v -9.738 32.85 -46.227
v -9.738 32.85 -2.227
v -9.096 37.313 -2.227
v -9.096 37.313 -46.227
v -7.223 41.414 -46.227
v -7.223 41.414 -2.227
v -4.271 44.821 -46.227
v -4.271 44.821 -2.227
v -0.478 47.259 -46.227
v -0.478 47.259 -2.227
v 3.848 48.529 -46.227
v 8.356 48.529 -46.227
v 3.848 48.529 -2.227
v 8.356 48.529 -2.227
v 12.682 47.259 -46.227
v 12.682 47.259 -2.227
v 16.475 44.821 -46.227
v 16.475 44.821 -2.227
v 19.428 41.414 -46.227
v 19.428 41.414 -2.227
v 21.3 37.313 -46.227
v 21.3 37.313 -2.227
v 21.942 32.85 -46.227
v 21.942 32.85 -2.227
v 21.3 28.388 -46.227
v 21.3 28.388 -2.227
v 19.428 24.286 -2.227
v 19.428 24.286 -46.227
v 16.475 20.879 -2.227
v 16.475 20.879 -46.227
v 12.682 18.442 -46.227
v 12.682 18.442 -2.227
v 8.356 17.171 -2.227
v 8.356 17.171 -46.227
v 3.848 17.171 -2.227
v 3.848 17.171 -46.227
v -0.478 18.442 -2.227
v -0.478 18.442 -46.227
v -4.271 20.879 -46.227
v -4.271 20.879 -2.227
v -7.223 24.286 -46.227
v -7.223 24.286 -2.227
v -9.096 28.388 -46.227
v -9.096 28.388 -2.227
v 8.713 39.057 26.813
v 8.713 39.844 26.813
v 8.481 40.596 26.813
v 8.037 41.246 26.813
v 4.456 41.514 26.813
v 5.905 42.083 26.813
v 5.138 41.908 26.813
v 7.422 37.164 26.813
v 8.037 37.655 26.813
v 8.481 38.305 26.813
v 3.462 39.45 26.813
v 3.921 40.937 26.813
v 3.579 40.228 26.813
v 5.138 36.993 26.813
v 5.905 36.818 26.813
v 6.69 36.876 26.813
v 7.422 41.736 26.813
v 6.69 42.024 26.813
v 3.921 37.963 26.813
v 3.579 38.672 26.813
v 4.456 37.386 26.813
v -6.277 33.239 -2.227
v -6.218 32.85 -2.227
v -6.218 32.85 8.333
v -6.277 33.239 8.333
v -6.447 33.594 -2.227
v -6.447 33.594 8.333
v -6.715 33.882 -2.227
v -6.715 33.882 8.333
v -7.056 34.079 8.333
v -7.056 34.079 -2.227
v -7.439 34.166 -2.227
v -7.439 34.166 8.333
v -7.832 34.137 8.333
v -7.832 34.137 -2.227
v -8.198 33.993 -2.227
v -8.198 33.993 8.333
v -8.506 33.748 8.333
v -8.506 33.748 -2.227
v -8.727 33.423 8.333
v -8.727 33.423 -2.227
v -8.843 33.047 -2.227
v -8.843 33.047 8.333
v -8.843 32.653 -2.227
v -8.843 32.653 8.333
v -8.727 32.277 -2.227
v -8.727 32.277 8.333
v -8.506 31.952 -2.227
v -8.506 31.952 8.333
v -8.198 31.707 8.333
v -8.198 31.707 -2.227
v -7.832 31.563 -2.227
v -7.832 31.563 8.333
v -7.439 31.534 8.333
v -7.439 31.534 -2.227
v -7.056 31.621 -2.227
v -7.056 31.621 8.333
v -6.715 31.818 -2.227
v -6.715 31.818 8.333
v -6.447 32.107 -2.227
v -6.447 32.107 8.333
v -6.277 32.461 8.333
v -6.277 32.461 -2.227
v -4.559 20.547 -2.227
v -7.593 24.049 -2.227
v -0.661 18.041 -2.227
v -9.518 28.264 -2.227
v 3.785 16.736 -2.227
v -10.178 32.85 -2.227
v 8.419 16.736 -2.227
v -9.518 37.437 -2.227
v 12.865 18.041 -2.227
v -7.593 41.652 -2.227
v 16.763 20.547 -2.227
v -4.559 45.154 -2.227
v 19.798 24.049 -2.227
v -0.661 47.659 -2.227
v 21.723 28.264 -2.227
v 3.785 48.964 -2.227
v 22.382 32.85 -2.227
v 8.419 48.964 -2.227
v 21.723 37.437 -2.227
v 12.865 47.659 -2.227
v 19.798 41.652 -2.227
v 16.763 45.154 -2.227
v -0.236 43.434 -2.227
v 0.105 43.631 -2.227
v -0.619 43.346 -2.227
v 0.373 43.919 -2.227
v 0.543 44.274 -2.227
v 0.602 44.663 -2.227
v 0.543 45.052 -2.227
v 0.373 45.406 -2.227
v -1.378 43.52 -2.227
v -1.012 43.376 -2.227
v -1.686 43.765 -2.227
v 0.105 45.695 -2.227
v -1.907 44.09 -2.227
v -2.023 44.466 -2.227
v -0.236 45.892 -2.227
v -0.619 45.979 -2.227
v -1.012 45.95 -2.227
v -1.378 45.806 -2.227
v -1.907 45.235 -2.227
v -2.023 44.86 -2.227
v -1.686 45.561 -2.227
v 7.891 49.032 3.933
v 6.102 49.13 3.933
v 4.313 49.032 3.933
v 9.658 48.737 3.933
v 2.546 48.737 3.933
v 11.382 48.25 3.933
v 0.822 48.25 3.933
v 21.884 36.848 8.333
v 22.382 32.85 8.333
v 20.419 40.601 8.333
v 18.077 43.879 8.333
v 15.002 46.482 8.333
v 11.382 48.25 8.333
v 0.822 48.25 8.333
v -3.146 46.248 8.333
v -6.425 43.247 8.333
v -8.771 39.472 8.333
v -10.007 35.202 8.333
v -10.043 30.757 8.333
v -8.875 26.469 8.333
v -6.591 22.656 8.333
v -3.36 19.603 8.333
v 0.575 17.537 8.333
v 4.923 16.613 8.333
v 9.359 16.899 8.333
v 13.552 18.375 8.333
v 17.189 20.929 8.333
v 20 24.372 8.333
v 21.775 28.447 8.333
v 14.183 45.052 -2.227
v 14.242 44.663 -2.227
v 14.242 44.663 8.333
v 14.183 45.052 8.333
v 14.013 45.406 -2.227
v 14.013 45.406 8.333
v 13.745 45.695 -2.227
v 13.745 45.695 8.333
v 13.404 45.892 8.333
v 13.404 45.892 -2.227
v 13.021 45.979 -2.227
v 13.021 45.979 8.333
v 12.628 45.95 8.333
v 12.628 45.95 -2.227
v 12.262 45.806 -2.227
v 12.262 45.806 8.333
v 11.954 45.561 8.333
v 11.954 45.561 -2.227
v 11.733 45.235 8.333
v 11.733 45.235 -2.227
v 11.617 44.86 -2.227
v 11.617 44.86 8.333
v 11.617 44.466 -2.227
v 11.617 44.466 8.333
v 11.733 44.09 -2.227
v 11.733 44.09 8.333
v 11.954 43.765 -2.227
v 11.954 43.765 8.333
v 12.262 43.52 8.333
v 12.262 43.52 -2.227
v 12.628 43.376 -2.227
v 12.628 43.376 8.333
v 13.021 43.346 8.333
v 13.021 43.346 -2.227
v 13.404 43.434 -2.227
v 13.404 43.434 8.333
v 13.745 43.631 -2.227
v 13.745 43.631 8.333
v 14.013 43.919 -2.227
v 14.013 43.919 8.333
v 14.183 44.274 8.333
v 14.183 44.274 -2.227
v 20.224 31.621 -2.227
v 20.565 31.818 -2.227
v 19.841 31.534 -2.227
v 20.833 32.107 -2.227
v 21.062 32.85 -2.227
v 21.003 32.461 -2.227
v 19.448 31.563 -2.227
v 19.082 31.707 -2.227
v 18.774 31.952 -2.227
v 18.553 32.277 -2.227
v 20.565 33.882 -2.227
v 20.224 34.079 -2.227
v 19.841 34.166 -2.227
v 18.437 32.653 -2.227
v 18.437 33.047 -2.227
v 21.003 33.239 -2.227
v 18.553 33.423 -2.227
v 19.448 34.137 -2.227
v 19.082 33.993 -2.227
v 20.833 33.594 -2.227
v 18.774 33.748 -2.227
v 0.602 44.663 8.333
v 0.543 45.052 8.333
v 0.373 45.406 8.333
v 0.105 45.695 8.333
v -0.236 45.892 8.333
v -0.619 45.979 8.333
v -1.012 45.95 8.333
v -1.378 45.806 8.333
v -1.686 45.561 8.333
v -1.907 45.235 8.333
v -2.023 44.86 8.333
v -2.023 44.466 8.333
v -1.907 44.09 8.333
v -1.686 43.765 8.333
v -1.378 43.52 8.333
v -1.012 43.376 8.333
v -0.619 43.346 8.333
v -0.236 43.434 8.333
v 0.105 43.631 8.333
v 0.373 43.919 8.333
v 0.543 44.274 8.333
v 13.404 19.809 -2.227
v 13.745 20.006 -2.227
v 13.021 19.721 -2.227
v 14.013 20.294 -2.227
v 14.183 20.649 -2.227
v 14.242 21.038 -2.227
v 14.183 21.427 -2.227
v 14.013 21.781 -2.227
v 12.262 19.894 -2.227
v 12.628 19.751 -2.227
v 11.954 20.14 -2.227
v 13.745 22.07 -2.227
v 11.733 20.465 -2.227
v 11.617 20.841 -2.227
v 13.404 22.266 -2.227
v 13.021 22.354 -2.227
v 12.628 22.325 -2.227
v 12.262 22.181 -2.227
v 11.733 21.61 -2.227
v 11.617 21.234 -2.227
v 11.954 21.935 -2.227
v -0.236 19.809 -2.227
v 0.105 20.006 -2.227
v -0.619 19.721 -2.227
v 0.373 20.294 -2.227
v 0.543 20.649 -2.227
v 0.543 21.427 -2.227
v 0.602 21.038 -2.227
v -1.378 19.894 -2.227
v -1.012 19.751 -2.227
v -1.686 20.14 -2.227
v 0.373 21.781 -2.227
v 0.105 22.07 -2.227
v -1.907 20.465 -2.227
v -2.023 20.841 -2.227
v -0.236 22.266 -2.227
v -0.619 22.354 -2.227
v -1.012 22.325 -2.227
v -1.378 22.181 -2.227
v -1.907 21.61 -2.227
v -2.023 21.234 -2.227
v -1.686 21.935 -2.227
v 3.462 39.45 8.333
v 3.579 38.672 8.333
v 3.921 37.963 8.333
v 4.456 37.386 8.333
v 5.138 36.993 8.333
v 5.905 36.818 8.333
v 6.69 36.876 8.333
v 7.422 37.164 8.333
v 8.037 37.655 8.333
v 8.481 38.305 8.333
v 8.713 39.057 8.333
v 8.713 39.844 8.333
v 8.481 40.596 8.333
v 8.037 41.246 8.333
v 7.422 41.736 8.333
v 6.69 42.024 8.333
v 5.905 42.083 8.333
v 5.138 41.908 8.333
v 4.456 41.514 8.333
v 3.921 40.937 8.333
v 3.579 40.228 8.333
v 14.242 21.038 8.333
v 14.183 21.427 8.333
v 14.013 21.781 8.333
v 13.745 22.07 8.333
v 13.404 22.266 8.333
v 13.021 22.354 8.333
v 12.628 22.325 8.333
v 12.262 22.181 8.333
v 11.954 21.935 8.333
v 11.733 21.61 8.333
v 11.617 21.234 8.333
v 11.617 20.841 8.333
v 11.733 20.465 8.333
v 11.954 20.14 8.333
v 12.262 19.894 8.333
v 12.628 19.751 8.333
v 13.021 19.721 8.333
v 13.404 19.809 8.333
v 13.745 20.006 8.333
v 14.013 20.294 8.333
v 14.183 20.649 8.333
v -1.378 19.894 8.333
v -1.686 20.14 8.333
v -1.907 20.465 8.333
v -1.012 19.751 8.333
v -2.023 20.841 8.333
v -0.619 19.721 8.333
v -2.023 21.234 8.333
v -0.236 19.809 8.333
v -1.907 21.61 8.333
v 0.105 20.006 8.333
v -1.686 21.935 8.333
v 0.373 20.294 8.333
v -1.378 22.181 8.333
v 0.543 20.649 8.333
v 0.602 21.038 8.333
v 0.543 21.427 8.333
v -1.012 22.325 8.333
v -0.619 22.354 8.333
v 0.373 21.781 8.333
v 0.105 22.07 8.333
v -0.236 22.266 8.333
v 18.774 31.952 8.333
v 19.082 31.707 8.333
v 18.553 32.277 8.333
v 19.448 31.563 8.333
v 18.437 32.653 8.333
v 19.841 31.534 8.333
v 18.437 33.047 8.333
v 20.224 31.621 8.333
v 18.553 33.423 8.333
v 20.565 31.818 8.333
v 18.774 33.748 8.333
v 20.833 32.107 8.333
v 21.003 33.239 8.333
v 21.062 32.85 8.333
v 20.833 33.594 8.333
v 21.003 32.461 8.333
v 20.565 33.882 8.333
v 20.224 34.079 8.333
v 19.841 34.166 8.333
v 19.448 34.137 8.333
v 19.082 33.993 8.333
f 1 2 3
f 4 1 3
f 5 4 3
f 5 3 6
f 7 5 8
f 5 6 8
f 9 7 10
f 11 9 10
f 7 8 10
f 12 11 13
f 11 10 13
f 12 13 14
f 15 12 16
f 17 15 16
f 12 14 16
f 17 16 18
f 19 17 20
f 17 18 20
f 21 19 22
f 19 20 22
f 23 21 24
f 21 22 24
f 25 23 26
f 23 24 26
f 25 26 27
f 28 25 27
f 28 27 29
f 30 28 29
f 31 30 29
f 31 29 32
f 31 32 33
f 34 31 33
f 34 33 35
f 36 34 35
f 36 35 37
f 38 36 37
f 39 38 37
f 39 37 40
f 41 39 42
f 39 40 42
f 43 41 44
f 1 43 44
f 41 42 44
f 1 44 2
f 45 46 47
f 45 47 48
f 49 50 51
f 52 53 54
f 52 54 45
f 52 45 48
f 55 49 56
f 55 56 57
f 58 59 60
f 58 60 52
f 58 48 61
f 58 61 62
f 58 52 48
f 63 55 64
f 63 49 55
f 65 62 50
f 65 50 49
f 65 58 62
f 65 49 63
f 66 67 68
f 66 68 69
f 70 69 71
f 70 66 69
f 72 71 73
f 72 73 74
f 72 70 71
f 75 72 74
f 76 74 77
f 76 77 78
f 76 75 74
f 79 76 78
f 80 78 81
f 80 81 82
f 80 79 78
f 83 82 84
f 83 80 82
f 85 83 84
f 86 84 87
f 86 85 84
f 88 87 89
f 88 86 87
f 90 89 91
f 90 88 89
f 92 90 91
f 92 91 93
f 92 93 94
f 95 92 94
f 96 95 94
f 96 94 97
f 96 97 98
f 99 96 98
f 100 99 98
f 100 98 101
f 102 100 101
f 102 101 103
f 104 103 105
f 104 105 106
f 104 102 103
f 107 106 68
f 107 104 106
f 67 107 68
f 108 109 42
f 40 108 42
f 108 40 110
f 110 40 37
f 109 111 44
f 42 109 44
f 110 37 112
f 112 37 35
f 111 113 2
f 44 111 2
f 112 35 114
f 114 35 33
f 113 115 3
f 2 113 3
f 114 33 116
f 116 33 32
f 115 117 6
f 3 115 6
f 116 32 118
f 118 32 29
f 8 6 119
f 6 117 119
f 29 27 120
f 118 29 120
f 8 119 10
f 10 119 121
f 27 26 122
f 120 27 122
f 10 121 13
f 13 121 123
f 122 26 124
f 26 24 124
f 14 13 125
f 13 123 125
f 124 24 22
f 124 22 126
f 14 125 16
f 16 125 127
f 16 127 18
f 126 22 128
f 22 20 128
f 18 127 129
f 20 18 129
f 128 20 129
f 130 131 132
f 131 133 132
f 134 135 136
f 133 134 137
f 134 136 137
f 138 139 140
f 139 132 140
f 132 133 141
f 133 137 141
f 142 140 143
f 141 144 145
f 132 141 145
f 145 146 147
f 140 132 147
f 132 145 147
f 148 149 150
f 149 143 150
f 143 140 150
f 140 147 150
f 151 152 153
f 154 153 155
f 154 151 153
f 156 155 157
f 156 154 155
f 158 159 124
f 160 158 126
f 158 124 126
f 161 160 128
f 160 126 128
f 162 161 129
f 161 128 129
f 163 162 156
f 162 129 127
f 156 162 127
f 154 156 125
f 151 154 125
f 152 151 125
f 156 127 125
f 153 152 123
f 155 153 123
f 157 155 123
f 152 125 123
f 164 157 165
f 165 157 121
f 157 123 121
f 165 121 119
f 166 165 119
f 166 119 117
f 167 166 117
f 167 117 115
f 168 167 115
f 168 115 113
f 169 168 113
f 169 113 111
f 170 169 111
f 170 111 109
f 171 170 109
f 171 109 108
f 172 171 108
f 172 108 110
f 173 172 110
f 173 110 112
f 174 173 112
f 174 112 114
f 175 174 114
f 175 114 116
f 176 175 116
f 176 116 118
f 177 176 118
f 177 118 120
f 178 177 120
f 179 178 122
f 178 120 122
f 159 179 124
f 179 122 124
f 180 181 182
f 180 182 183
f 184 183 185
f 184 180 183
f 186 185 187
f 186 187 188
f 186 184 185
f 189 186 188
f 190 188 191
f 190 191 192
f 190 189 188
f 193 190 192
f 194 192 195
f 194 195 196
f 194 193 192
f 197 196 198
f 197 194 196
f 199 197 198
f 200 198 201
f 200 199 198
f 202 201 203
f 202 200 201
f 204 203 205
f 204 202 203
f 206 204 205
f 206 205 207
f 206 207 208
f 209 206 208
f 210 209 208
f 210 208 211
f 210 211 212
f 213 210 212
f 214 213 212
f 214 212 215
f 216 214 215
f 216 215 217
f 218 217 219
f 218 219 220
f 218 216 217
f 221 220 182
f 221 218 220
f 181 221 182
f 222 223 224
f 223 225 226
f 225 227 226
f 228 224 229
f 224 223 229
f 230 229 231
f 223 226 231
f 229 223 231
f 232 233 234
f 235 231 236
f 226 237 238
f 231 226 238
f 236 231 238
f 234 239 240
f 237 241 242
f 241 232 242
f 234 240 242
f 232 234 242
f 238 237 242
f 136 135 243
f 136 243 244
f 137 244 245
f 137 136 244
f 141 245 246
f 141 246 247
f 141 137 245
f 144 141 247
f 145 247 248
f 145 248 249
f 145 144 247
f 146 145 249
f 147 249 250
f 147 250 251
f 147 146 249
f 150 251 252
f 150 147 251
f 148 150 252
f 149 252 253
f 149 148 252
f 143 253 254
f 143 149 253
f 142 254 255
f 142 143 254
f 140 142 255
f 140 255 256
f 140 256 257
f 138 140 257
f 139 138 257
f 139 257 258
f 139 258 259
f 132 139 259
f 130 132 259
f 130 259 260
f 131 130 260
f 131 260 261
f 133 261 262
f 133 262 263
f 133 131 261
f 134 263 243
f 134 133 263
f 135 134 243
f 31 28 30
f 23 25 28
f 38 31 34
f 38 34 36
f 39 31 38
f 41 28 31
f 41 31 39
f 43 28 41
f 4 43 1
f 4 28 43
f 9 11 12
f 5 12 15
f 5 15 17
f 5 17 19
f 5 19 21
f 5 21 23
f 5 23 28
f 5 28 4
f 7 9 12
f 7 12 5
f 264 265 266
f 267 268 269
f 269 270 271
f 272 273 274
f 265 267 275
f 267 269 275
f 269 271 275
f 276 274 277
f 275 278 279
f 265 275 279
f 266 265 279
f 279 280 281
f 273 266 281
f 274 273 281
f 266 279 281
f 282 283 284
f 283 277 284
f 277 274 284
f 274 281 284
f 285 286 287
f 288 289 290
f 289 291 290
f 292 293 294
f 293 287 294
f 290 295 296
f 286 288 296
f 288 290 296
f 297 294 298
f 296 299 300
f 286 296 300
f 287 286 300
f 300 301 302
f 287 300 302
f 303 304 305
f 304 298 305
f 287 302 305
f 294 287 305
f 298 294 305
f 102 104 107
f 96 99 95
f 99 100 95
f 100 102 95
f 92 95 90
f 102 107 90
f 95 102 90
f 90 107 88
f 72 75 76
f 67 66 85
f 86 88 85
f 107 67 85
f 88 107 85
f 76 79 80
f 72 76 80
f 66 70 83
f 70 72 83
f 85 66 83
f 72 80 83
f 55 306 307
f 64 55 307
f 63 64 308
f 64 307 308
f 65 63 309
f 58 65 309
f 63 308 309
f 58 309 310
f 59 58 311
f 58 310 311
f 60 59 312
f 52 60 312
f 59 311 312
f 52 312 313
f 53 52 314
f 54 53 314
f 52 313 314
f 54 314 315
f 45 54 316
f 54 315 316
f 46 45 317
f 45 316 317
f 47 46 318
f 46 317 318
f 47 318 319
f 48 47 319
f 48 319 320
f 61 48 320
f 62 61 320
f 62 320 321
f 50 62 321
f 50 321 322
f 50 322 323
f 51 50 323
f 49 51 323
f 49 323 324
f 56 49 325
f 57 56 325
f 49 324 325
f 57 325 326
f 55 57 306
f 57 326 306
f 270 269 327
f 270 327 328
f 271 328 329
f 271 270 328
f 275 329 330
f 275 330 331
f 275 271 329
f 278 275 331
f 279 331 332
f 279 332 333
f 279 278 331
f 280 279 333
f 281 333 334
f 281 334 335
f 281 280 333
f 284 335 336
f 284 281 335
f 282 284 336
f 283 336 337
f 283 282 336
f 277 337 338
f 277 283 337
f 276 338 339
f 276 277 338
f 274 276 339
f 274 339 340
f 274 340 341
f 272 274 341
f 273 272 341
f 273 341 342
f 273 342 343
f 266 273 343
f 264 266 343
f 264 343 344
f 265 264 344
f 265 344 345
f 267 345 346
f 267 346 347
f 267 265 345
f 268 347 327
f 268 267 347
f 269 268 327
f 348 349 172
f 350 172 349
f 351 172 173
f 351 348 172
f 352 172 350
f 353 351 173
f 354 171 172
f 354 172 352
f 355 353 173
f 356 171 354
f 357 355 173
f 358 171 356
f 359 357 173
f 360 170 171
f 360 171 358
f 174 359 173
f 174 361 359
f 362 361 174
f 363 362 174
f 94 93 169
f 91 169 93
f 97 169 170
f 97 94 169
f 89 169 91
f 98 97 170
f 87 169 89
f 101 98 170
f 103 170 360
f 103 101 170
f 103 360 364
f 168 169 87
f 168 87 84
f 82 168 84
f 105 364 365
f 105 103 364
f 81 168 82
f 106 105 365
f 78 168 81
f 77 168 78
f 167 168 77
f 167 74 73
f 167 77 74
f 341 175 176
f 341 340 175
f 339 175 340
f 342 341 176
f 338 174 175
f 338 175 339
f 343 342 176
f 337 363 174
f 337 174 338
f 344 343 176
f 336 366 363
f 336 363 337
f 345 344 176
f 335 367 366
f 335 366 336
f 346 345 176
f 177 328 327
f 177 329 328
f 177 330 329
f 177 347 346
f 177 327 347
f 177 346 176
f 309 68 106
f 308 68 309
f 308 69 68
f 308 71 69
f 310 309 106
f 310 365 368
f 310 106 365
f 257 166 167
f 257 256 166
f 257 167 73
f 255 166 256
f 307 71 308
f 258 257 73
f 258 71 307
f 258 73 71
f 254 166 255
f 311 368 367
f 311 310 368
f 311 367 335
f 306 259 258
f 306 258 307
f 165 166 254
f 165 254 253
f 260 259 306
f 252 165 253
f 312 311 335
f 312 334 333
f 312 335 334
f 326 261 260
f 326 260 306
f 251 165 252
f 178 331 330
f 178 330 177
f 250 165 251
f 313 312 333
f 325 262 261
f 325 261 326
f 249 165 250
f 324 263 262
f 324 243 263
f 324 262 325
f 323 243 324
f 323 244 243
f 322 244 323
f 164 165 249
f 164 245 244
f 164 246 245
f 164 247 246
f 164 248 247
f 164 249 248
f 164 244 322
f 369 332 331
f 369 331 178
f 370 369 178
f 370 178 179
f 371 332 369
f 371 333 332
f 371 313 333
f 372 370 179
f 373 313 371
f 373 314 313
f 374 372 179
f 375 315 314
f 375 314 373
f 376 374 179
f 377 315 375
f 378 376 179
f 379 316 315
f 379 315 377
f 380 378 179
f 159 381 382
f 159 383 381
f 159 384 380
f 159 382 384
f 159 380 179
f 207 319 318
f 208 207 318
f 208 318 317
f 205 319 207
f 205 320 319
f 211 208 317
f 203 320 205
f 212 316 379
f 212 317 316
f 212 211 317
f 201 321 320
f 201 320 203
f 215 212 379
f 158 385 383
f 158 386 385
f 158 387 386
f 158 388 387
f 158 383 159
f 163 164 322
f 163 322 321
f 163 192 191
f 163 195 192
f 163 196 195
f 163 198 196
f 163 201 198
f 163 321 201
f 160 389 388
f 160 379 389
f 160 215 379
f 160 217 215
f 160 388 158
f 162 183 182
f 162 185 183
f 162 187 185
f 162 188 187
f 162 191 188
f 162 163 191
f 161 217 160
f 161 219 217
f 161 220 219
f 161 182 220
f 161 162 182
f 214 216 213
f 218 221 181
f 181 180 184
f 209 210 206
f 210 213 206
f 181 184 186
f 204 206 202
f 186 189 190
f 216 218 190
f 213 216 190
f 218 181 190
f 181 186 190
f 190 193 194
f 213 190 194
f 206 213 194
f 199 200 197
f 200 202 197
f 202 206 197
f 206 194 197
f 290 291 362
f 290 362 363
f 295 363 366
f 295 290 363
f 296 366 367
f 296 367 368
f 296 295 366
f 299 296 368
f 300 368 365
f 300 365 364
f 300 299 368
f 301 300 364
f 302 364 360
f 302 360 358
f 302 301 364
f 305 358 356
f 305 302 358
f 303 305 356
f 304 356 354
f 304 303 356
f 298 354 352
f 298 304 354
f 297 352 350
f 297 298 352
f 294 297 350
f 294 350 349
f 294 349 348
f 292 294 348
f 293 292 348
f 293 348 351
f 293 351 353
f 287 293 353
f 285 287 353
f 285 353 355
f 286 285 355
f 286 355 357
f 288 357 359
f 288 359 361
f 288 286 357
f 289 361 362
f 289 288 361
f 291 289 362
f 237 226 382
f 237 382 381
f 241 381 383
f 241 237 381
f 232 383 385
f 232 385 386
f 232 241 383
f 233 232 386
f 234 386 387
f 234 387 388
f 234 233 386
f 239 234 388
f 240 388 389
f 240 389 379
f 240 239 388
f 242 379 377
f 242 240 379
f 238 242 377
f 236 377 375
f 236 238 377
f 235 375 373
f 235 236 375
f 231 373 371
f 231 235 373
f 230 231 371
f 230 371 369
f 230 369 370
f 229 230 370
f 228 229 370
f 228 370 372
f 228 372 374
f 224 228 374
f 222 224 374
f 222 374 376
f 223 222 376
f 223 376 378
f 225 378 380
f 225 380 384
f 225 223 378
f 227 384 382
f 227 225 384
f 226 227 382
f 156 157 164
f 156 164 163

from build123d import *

# Parameters (mm, degrees)
SKETCH1_R           = 18.5
SKETCH1_R_2         = 1.5
SKETCH1_R_3         = 6.1
BOSS_EXTRUDE1_DEPTH = 12
SKETCH2_R           = 18
BOSS_EXTRUDE2_DEPTH = 50
SKETCH3_R           = 3
BOSS_EXTRUDE3_DEPTH = 21
SKETCH4_R           = 6.1
BOSS_EXTRUDE4_DEPTH = 12
CUT_EXTRUDE1_START  = -5
CUT_EXTRUDE1_DEPTH  = 5
SCALE1_SCALE        = 0.8
SCALE3_SCALE        = 1.1


with BuildPart() as part:
    # Sketch1 → Boss-Extrude1 (new body)
    with BuildSketch(Plane.XY):
        with Locations((6.10211523, 32.843167441)):
            Circle(SKETCH1_R)
        with Locations((21.60211523, 32.843167441)):
            Circle(SKETCH1_R_2, mode=Mode.SUBTRACT)
        with Locations((13.85211523, 19.419773682)):
            Circle(SKETCH1_R_2, mode=Mode.SUBTRACT)
        with Locations((-1.64788477, 19.419773682)):
            Circle(SKETCH1_R_2, mode=Mode.SUBTRACT)
        with Locations((-9.39788477, 32.843167441)):
            Circle(SKETCH1_R_2, mode=Mode.SUBTRACT)
        with Locations((-1.64788477, 46.266561199)):
            Circle(SKETCH1_R_2, mode=Mode.SUBTRACT)
        with Locations((13.85211523, 46.266561199)):
            Circle(SKETCH1_R_2, mode=Mode.SUBTRACT)
        with Locations((6.10211523, 40.343167441)):
            Circle(SKETCH1_R_3, mode=Mode.SUBTRACT)
    extrude(amount=BOSS_EXTRUDE1_DEPTH)

    # Sketch2 → Boss-Extrude2 (add)
    with BuildSketch(Plane(origin=(0, 0, 0), x_dir=(-1, 0, 0), z_dir=(0, 0, -1))):
        with Locations((-6.10211523, 32.843167441)):
            Circle(SKETCH2_R)
    extrude(amount=BOSS_EXTRUDE2_DEPTH)



with BuildPart() as body_2:
    # Sketch3 → Boss-Extrude3 (new body)
    with BuildSketch(Plane.XY.offset(12)):
        with Locations(Location((6.10211523, 40.343167441, 0), (0, 0, 180))):
            Circle(SKETCH3_R)
    extrude(amount=BOSS_EXTRUDE3_DEPTH)


with BuildPart() as part_1:
    add(part.part)

    add(body_2.part)  # Boss-Extrude4 merges body 2
    # Sketch4 → Boss-Extrude4 (add)
    with BuildSketch(Plane.XY):
        with Locations((6.10211523, 40.343167441)):
            Circle(SKETCH4_R)
    extrude(amount=BOSS_EXTRUDE4_DEPTH)

    # Sketch5 → Cut-Extrude1 (cut)
    with BuildSketch(Plane.XY.offset(12).offset(CUT_EXTRUDE1_START)):
        with BuildLine():
            Line((6.10211523, 50.343167441), (6.10211523, 51.343167441))
            ThreePointArc((6.10211523, 51.343167441), (3.060733965, 51.091455031), (0.10211523, 50.343167441))
            Line((0.10211523, 50.343167441), (6.10211523, 50.343167441))
        make_face()
        with BuildLine():
            ThreePointArc((12.10211523, 50.343167441), (9.143496496, 51.091455031), (6.10211523, 51.343167441))
            Line((6.10211523, 51.343167441), (6.10211523, 50.343167441))
            Line((6.10211523, 50.343167441), (12.10211523, 50.343167441))
        make_face()
    extrude(amount=CUT_EXTRUDE1_DEPTH, mode=Mode.SUBTRACT)


with BuildPart() as part_2:
    # Scale1: scaled about (6.10211523, 32.901644157, -18.561855602)
    add(part_1.part.scale(SCALE1_SCALE).moved(Location((1.220423046, 6.580328831, -3.71237112))))


with BuildPart() as part_3:
    # Scale3: scaled about (6.10211523, 32.901644157, -18.561855602)
    add(part_2.part.scale(SCALE3_SCALE).moved(Location((-0.610211523, -3.290164416, 1.85618556))))


solid = part_3.part
